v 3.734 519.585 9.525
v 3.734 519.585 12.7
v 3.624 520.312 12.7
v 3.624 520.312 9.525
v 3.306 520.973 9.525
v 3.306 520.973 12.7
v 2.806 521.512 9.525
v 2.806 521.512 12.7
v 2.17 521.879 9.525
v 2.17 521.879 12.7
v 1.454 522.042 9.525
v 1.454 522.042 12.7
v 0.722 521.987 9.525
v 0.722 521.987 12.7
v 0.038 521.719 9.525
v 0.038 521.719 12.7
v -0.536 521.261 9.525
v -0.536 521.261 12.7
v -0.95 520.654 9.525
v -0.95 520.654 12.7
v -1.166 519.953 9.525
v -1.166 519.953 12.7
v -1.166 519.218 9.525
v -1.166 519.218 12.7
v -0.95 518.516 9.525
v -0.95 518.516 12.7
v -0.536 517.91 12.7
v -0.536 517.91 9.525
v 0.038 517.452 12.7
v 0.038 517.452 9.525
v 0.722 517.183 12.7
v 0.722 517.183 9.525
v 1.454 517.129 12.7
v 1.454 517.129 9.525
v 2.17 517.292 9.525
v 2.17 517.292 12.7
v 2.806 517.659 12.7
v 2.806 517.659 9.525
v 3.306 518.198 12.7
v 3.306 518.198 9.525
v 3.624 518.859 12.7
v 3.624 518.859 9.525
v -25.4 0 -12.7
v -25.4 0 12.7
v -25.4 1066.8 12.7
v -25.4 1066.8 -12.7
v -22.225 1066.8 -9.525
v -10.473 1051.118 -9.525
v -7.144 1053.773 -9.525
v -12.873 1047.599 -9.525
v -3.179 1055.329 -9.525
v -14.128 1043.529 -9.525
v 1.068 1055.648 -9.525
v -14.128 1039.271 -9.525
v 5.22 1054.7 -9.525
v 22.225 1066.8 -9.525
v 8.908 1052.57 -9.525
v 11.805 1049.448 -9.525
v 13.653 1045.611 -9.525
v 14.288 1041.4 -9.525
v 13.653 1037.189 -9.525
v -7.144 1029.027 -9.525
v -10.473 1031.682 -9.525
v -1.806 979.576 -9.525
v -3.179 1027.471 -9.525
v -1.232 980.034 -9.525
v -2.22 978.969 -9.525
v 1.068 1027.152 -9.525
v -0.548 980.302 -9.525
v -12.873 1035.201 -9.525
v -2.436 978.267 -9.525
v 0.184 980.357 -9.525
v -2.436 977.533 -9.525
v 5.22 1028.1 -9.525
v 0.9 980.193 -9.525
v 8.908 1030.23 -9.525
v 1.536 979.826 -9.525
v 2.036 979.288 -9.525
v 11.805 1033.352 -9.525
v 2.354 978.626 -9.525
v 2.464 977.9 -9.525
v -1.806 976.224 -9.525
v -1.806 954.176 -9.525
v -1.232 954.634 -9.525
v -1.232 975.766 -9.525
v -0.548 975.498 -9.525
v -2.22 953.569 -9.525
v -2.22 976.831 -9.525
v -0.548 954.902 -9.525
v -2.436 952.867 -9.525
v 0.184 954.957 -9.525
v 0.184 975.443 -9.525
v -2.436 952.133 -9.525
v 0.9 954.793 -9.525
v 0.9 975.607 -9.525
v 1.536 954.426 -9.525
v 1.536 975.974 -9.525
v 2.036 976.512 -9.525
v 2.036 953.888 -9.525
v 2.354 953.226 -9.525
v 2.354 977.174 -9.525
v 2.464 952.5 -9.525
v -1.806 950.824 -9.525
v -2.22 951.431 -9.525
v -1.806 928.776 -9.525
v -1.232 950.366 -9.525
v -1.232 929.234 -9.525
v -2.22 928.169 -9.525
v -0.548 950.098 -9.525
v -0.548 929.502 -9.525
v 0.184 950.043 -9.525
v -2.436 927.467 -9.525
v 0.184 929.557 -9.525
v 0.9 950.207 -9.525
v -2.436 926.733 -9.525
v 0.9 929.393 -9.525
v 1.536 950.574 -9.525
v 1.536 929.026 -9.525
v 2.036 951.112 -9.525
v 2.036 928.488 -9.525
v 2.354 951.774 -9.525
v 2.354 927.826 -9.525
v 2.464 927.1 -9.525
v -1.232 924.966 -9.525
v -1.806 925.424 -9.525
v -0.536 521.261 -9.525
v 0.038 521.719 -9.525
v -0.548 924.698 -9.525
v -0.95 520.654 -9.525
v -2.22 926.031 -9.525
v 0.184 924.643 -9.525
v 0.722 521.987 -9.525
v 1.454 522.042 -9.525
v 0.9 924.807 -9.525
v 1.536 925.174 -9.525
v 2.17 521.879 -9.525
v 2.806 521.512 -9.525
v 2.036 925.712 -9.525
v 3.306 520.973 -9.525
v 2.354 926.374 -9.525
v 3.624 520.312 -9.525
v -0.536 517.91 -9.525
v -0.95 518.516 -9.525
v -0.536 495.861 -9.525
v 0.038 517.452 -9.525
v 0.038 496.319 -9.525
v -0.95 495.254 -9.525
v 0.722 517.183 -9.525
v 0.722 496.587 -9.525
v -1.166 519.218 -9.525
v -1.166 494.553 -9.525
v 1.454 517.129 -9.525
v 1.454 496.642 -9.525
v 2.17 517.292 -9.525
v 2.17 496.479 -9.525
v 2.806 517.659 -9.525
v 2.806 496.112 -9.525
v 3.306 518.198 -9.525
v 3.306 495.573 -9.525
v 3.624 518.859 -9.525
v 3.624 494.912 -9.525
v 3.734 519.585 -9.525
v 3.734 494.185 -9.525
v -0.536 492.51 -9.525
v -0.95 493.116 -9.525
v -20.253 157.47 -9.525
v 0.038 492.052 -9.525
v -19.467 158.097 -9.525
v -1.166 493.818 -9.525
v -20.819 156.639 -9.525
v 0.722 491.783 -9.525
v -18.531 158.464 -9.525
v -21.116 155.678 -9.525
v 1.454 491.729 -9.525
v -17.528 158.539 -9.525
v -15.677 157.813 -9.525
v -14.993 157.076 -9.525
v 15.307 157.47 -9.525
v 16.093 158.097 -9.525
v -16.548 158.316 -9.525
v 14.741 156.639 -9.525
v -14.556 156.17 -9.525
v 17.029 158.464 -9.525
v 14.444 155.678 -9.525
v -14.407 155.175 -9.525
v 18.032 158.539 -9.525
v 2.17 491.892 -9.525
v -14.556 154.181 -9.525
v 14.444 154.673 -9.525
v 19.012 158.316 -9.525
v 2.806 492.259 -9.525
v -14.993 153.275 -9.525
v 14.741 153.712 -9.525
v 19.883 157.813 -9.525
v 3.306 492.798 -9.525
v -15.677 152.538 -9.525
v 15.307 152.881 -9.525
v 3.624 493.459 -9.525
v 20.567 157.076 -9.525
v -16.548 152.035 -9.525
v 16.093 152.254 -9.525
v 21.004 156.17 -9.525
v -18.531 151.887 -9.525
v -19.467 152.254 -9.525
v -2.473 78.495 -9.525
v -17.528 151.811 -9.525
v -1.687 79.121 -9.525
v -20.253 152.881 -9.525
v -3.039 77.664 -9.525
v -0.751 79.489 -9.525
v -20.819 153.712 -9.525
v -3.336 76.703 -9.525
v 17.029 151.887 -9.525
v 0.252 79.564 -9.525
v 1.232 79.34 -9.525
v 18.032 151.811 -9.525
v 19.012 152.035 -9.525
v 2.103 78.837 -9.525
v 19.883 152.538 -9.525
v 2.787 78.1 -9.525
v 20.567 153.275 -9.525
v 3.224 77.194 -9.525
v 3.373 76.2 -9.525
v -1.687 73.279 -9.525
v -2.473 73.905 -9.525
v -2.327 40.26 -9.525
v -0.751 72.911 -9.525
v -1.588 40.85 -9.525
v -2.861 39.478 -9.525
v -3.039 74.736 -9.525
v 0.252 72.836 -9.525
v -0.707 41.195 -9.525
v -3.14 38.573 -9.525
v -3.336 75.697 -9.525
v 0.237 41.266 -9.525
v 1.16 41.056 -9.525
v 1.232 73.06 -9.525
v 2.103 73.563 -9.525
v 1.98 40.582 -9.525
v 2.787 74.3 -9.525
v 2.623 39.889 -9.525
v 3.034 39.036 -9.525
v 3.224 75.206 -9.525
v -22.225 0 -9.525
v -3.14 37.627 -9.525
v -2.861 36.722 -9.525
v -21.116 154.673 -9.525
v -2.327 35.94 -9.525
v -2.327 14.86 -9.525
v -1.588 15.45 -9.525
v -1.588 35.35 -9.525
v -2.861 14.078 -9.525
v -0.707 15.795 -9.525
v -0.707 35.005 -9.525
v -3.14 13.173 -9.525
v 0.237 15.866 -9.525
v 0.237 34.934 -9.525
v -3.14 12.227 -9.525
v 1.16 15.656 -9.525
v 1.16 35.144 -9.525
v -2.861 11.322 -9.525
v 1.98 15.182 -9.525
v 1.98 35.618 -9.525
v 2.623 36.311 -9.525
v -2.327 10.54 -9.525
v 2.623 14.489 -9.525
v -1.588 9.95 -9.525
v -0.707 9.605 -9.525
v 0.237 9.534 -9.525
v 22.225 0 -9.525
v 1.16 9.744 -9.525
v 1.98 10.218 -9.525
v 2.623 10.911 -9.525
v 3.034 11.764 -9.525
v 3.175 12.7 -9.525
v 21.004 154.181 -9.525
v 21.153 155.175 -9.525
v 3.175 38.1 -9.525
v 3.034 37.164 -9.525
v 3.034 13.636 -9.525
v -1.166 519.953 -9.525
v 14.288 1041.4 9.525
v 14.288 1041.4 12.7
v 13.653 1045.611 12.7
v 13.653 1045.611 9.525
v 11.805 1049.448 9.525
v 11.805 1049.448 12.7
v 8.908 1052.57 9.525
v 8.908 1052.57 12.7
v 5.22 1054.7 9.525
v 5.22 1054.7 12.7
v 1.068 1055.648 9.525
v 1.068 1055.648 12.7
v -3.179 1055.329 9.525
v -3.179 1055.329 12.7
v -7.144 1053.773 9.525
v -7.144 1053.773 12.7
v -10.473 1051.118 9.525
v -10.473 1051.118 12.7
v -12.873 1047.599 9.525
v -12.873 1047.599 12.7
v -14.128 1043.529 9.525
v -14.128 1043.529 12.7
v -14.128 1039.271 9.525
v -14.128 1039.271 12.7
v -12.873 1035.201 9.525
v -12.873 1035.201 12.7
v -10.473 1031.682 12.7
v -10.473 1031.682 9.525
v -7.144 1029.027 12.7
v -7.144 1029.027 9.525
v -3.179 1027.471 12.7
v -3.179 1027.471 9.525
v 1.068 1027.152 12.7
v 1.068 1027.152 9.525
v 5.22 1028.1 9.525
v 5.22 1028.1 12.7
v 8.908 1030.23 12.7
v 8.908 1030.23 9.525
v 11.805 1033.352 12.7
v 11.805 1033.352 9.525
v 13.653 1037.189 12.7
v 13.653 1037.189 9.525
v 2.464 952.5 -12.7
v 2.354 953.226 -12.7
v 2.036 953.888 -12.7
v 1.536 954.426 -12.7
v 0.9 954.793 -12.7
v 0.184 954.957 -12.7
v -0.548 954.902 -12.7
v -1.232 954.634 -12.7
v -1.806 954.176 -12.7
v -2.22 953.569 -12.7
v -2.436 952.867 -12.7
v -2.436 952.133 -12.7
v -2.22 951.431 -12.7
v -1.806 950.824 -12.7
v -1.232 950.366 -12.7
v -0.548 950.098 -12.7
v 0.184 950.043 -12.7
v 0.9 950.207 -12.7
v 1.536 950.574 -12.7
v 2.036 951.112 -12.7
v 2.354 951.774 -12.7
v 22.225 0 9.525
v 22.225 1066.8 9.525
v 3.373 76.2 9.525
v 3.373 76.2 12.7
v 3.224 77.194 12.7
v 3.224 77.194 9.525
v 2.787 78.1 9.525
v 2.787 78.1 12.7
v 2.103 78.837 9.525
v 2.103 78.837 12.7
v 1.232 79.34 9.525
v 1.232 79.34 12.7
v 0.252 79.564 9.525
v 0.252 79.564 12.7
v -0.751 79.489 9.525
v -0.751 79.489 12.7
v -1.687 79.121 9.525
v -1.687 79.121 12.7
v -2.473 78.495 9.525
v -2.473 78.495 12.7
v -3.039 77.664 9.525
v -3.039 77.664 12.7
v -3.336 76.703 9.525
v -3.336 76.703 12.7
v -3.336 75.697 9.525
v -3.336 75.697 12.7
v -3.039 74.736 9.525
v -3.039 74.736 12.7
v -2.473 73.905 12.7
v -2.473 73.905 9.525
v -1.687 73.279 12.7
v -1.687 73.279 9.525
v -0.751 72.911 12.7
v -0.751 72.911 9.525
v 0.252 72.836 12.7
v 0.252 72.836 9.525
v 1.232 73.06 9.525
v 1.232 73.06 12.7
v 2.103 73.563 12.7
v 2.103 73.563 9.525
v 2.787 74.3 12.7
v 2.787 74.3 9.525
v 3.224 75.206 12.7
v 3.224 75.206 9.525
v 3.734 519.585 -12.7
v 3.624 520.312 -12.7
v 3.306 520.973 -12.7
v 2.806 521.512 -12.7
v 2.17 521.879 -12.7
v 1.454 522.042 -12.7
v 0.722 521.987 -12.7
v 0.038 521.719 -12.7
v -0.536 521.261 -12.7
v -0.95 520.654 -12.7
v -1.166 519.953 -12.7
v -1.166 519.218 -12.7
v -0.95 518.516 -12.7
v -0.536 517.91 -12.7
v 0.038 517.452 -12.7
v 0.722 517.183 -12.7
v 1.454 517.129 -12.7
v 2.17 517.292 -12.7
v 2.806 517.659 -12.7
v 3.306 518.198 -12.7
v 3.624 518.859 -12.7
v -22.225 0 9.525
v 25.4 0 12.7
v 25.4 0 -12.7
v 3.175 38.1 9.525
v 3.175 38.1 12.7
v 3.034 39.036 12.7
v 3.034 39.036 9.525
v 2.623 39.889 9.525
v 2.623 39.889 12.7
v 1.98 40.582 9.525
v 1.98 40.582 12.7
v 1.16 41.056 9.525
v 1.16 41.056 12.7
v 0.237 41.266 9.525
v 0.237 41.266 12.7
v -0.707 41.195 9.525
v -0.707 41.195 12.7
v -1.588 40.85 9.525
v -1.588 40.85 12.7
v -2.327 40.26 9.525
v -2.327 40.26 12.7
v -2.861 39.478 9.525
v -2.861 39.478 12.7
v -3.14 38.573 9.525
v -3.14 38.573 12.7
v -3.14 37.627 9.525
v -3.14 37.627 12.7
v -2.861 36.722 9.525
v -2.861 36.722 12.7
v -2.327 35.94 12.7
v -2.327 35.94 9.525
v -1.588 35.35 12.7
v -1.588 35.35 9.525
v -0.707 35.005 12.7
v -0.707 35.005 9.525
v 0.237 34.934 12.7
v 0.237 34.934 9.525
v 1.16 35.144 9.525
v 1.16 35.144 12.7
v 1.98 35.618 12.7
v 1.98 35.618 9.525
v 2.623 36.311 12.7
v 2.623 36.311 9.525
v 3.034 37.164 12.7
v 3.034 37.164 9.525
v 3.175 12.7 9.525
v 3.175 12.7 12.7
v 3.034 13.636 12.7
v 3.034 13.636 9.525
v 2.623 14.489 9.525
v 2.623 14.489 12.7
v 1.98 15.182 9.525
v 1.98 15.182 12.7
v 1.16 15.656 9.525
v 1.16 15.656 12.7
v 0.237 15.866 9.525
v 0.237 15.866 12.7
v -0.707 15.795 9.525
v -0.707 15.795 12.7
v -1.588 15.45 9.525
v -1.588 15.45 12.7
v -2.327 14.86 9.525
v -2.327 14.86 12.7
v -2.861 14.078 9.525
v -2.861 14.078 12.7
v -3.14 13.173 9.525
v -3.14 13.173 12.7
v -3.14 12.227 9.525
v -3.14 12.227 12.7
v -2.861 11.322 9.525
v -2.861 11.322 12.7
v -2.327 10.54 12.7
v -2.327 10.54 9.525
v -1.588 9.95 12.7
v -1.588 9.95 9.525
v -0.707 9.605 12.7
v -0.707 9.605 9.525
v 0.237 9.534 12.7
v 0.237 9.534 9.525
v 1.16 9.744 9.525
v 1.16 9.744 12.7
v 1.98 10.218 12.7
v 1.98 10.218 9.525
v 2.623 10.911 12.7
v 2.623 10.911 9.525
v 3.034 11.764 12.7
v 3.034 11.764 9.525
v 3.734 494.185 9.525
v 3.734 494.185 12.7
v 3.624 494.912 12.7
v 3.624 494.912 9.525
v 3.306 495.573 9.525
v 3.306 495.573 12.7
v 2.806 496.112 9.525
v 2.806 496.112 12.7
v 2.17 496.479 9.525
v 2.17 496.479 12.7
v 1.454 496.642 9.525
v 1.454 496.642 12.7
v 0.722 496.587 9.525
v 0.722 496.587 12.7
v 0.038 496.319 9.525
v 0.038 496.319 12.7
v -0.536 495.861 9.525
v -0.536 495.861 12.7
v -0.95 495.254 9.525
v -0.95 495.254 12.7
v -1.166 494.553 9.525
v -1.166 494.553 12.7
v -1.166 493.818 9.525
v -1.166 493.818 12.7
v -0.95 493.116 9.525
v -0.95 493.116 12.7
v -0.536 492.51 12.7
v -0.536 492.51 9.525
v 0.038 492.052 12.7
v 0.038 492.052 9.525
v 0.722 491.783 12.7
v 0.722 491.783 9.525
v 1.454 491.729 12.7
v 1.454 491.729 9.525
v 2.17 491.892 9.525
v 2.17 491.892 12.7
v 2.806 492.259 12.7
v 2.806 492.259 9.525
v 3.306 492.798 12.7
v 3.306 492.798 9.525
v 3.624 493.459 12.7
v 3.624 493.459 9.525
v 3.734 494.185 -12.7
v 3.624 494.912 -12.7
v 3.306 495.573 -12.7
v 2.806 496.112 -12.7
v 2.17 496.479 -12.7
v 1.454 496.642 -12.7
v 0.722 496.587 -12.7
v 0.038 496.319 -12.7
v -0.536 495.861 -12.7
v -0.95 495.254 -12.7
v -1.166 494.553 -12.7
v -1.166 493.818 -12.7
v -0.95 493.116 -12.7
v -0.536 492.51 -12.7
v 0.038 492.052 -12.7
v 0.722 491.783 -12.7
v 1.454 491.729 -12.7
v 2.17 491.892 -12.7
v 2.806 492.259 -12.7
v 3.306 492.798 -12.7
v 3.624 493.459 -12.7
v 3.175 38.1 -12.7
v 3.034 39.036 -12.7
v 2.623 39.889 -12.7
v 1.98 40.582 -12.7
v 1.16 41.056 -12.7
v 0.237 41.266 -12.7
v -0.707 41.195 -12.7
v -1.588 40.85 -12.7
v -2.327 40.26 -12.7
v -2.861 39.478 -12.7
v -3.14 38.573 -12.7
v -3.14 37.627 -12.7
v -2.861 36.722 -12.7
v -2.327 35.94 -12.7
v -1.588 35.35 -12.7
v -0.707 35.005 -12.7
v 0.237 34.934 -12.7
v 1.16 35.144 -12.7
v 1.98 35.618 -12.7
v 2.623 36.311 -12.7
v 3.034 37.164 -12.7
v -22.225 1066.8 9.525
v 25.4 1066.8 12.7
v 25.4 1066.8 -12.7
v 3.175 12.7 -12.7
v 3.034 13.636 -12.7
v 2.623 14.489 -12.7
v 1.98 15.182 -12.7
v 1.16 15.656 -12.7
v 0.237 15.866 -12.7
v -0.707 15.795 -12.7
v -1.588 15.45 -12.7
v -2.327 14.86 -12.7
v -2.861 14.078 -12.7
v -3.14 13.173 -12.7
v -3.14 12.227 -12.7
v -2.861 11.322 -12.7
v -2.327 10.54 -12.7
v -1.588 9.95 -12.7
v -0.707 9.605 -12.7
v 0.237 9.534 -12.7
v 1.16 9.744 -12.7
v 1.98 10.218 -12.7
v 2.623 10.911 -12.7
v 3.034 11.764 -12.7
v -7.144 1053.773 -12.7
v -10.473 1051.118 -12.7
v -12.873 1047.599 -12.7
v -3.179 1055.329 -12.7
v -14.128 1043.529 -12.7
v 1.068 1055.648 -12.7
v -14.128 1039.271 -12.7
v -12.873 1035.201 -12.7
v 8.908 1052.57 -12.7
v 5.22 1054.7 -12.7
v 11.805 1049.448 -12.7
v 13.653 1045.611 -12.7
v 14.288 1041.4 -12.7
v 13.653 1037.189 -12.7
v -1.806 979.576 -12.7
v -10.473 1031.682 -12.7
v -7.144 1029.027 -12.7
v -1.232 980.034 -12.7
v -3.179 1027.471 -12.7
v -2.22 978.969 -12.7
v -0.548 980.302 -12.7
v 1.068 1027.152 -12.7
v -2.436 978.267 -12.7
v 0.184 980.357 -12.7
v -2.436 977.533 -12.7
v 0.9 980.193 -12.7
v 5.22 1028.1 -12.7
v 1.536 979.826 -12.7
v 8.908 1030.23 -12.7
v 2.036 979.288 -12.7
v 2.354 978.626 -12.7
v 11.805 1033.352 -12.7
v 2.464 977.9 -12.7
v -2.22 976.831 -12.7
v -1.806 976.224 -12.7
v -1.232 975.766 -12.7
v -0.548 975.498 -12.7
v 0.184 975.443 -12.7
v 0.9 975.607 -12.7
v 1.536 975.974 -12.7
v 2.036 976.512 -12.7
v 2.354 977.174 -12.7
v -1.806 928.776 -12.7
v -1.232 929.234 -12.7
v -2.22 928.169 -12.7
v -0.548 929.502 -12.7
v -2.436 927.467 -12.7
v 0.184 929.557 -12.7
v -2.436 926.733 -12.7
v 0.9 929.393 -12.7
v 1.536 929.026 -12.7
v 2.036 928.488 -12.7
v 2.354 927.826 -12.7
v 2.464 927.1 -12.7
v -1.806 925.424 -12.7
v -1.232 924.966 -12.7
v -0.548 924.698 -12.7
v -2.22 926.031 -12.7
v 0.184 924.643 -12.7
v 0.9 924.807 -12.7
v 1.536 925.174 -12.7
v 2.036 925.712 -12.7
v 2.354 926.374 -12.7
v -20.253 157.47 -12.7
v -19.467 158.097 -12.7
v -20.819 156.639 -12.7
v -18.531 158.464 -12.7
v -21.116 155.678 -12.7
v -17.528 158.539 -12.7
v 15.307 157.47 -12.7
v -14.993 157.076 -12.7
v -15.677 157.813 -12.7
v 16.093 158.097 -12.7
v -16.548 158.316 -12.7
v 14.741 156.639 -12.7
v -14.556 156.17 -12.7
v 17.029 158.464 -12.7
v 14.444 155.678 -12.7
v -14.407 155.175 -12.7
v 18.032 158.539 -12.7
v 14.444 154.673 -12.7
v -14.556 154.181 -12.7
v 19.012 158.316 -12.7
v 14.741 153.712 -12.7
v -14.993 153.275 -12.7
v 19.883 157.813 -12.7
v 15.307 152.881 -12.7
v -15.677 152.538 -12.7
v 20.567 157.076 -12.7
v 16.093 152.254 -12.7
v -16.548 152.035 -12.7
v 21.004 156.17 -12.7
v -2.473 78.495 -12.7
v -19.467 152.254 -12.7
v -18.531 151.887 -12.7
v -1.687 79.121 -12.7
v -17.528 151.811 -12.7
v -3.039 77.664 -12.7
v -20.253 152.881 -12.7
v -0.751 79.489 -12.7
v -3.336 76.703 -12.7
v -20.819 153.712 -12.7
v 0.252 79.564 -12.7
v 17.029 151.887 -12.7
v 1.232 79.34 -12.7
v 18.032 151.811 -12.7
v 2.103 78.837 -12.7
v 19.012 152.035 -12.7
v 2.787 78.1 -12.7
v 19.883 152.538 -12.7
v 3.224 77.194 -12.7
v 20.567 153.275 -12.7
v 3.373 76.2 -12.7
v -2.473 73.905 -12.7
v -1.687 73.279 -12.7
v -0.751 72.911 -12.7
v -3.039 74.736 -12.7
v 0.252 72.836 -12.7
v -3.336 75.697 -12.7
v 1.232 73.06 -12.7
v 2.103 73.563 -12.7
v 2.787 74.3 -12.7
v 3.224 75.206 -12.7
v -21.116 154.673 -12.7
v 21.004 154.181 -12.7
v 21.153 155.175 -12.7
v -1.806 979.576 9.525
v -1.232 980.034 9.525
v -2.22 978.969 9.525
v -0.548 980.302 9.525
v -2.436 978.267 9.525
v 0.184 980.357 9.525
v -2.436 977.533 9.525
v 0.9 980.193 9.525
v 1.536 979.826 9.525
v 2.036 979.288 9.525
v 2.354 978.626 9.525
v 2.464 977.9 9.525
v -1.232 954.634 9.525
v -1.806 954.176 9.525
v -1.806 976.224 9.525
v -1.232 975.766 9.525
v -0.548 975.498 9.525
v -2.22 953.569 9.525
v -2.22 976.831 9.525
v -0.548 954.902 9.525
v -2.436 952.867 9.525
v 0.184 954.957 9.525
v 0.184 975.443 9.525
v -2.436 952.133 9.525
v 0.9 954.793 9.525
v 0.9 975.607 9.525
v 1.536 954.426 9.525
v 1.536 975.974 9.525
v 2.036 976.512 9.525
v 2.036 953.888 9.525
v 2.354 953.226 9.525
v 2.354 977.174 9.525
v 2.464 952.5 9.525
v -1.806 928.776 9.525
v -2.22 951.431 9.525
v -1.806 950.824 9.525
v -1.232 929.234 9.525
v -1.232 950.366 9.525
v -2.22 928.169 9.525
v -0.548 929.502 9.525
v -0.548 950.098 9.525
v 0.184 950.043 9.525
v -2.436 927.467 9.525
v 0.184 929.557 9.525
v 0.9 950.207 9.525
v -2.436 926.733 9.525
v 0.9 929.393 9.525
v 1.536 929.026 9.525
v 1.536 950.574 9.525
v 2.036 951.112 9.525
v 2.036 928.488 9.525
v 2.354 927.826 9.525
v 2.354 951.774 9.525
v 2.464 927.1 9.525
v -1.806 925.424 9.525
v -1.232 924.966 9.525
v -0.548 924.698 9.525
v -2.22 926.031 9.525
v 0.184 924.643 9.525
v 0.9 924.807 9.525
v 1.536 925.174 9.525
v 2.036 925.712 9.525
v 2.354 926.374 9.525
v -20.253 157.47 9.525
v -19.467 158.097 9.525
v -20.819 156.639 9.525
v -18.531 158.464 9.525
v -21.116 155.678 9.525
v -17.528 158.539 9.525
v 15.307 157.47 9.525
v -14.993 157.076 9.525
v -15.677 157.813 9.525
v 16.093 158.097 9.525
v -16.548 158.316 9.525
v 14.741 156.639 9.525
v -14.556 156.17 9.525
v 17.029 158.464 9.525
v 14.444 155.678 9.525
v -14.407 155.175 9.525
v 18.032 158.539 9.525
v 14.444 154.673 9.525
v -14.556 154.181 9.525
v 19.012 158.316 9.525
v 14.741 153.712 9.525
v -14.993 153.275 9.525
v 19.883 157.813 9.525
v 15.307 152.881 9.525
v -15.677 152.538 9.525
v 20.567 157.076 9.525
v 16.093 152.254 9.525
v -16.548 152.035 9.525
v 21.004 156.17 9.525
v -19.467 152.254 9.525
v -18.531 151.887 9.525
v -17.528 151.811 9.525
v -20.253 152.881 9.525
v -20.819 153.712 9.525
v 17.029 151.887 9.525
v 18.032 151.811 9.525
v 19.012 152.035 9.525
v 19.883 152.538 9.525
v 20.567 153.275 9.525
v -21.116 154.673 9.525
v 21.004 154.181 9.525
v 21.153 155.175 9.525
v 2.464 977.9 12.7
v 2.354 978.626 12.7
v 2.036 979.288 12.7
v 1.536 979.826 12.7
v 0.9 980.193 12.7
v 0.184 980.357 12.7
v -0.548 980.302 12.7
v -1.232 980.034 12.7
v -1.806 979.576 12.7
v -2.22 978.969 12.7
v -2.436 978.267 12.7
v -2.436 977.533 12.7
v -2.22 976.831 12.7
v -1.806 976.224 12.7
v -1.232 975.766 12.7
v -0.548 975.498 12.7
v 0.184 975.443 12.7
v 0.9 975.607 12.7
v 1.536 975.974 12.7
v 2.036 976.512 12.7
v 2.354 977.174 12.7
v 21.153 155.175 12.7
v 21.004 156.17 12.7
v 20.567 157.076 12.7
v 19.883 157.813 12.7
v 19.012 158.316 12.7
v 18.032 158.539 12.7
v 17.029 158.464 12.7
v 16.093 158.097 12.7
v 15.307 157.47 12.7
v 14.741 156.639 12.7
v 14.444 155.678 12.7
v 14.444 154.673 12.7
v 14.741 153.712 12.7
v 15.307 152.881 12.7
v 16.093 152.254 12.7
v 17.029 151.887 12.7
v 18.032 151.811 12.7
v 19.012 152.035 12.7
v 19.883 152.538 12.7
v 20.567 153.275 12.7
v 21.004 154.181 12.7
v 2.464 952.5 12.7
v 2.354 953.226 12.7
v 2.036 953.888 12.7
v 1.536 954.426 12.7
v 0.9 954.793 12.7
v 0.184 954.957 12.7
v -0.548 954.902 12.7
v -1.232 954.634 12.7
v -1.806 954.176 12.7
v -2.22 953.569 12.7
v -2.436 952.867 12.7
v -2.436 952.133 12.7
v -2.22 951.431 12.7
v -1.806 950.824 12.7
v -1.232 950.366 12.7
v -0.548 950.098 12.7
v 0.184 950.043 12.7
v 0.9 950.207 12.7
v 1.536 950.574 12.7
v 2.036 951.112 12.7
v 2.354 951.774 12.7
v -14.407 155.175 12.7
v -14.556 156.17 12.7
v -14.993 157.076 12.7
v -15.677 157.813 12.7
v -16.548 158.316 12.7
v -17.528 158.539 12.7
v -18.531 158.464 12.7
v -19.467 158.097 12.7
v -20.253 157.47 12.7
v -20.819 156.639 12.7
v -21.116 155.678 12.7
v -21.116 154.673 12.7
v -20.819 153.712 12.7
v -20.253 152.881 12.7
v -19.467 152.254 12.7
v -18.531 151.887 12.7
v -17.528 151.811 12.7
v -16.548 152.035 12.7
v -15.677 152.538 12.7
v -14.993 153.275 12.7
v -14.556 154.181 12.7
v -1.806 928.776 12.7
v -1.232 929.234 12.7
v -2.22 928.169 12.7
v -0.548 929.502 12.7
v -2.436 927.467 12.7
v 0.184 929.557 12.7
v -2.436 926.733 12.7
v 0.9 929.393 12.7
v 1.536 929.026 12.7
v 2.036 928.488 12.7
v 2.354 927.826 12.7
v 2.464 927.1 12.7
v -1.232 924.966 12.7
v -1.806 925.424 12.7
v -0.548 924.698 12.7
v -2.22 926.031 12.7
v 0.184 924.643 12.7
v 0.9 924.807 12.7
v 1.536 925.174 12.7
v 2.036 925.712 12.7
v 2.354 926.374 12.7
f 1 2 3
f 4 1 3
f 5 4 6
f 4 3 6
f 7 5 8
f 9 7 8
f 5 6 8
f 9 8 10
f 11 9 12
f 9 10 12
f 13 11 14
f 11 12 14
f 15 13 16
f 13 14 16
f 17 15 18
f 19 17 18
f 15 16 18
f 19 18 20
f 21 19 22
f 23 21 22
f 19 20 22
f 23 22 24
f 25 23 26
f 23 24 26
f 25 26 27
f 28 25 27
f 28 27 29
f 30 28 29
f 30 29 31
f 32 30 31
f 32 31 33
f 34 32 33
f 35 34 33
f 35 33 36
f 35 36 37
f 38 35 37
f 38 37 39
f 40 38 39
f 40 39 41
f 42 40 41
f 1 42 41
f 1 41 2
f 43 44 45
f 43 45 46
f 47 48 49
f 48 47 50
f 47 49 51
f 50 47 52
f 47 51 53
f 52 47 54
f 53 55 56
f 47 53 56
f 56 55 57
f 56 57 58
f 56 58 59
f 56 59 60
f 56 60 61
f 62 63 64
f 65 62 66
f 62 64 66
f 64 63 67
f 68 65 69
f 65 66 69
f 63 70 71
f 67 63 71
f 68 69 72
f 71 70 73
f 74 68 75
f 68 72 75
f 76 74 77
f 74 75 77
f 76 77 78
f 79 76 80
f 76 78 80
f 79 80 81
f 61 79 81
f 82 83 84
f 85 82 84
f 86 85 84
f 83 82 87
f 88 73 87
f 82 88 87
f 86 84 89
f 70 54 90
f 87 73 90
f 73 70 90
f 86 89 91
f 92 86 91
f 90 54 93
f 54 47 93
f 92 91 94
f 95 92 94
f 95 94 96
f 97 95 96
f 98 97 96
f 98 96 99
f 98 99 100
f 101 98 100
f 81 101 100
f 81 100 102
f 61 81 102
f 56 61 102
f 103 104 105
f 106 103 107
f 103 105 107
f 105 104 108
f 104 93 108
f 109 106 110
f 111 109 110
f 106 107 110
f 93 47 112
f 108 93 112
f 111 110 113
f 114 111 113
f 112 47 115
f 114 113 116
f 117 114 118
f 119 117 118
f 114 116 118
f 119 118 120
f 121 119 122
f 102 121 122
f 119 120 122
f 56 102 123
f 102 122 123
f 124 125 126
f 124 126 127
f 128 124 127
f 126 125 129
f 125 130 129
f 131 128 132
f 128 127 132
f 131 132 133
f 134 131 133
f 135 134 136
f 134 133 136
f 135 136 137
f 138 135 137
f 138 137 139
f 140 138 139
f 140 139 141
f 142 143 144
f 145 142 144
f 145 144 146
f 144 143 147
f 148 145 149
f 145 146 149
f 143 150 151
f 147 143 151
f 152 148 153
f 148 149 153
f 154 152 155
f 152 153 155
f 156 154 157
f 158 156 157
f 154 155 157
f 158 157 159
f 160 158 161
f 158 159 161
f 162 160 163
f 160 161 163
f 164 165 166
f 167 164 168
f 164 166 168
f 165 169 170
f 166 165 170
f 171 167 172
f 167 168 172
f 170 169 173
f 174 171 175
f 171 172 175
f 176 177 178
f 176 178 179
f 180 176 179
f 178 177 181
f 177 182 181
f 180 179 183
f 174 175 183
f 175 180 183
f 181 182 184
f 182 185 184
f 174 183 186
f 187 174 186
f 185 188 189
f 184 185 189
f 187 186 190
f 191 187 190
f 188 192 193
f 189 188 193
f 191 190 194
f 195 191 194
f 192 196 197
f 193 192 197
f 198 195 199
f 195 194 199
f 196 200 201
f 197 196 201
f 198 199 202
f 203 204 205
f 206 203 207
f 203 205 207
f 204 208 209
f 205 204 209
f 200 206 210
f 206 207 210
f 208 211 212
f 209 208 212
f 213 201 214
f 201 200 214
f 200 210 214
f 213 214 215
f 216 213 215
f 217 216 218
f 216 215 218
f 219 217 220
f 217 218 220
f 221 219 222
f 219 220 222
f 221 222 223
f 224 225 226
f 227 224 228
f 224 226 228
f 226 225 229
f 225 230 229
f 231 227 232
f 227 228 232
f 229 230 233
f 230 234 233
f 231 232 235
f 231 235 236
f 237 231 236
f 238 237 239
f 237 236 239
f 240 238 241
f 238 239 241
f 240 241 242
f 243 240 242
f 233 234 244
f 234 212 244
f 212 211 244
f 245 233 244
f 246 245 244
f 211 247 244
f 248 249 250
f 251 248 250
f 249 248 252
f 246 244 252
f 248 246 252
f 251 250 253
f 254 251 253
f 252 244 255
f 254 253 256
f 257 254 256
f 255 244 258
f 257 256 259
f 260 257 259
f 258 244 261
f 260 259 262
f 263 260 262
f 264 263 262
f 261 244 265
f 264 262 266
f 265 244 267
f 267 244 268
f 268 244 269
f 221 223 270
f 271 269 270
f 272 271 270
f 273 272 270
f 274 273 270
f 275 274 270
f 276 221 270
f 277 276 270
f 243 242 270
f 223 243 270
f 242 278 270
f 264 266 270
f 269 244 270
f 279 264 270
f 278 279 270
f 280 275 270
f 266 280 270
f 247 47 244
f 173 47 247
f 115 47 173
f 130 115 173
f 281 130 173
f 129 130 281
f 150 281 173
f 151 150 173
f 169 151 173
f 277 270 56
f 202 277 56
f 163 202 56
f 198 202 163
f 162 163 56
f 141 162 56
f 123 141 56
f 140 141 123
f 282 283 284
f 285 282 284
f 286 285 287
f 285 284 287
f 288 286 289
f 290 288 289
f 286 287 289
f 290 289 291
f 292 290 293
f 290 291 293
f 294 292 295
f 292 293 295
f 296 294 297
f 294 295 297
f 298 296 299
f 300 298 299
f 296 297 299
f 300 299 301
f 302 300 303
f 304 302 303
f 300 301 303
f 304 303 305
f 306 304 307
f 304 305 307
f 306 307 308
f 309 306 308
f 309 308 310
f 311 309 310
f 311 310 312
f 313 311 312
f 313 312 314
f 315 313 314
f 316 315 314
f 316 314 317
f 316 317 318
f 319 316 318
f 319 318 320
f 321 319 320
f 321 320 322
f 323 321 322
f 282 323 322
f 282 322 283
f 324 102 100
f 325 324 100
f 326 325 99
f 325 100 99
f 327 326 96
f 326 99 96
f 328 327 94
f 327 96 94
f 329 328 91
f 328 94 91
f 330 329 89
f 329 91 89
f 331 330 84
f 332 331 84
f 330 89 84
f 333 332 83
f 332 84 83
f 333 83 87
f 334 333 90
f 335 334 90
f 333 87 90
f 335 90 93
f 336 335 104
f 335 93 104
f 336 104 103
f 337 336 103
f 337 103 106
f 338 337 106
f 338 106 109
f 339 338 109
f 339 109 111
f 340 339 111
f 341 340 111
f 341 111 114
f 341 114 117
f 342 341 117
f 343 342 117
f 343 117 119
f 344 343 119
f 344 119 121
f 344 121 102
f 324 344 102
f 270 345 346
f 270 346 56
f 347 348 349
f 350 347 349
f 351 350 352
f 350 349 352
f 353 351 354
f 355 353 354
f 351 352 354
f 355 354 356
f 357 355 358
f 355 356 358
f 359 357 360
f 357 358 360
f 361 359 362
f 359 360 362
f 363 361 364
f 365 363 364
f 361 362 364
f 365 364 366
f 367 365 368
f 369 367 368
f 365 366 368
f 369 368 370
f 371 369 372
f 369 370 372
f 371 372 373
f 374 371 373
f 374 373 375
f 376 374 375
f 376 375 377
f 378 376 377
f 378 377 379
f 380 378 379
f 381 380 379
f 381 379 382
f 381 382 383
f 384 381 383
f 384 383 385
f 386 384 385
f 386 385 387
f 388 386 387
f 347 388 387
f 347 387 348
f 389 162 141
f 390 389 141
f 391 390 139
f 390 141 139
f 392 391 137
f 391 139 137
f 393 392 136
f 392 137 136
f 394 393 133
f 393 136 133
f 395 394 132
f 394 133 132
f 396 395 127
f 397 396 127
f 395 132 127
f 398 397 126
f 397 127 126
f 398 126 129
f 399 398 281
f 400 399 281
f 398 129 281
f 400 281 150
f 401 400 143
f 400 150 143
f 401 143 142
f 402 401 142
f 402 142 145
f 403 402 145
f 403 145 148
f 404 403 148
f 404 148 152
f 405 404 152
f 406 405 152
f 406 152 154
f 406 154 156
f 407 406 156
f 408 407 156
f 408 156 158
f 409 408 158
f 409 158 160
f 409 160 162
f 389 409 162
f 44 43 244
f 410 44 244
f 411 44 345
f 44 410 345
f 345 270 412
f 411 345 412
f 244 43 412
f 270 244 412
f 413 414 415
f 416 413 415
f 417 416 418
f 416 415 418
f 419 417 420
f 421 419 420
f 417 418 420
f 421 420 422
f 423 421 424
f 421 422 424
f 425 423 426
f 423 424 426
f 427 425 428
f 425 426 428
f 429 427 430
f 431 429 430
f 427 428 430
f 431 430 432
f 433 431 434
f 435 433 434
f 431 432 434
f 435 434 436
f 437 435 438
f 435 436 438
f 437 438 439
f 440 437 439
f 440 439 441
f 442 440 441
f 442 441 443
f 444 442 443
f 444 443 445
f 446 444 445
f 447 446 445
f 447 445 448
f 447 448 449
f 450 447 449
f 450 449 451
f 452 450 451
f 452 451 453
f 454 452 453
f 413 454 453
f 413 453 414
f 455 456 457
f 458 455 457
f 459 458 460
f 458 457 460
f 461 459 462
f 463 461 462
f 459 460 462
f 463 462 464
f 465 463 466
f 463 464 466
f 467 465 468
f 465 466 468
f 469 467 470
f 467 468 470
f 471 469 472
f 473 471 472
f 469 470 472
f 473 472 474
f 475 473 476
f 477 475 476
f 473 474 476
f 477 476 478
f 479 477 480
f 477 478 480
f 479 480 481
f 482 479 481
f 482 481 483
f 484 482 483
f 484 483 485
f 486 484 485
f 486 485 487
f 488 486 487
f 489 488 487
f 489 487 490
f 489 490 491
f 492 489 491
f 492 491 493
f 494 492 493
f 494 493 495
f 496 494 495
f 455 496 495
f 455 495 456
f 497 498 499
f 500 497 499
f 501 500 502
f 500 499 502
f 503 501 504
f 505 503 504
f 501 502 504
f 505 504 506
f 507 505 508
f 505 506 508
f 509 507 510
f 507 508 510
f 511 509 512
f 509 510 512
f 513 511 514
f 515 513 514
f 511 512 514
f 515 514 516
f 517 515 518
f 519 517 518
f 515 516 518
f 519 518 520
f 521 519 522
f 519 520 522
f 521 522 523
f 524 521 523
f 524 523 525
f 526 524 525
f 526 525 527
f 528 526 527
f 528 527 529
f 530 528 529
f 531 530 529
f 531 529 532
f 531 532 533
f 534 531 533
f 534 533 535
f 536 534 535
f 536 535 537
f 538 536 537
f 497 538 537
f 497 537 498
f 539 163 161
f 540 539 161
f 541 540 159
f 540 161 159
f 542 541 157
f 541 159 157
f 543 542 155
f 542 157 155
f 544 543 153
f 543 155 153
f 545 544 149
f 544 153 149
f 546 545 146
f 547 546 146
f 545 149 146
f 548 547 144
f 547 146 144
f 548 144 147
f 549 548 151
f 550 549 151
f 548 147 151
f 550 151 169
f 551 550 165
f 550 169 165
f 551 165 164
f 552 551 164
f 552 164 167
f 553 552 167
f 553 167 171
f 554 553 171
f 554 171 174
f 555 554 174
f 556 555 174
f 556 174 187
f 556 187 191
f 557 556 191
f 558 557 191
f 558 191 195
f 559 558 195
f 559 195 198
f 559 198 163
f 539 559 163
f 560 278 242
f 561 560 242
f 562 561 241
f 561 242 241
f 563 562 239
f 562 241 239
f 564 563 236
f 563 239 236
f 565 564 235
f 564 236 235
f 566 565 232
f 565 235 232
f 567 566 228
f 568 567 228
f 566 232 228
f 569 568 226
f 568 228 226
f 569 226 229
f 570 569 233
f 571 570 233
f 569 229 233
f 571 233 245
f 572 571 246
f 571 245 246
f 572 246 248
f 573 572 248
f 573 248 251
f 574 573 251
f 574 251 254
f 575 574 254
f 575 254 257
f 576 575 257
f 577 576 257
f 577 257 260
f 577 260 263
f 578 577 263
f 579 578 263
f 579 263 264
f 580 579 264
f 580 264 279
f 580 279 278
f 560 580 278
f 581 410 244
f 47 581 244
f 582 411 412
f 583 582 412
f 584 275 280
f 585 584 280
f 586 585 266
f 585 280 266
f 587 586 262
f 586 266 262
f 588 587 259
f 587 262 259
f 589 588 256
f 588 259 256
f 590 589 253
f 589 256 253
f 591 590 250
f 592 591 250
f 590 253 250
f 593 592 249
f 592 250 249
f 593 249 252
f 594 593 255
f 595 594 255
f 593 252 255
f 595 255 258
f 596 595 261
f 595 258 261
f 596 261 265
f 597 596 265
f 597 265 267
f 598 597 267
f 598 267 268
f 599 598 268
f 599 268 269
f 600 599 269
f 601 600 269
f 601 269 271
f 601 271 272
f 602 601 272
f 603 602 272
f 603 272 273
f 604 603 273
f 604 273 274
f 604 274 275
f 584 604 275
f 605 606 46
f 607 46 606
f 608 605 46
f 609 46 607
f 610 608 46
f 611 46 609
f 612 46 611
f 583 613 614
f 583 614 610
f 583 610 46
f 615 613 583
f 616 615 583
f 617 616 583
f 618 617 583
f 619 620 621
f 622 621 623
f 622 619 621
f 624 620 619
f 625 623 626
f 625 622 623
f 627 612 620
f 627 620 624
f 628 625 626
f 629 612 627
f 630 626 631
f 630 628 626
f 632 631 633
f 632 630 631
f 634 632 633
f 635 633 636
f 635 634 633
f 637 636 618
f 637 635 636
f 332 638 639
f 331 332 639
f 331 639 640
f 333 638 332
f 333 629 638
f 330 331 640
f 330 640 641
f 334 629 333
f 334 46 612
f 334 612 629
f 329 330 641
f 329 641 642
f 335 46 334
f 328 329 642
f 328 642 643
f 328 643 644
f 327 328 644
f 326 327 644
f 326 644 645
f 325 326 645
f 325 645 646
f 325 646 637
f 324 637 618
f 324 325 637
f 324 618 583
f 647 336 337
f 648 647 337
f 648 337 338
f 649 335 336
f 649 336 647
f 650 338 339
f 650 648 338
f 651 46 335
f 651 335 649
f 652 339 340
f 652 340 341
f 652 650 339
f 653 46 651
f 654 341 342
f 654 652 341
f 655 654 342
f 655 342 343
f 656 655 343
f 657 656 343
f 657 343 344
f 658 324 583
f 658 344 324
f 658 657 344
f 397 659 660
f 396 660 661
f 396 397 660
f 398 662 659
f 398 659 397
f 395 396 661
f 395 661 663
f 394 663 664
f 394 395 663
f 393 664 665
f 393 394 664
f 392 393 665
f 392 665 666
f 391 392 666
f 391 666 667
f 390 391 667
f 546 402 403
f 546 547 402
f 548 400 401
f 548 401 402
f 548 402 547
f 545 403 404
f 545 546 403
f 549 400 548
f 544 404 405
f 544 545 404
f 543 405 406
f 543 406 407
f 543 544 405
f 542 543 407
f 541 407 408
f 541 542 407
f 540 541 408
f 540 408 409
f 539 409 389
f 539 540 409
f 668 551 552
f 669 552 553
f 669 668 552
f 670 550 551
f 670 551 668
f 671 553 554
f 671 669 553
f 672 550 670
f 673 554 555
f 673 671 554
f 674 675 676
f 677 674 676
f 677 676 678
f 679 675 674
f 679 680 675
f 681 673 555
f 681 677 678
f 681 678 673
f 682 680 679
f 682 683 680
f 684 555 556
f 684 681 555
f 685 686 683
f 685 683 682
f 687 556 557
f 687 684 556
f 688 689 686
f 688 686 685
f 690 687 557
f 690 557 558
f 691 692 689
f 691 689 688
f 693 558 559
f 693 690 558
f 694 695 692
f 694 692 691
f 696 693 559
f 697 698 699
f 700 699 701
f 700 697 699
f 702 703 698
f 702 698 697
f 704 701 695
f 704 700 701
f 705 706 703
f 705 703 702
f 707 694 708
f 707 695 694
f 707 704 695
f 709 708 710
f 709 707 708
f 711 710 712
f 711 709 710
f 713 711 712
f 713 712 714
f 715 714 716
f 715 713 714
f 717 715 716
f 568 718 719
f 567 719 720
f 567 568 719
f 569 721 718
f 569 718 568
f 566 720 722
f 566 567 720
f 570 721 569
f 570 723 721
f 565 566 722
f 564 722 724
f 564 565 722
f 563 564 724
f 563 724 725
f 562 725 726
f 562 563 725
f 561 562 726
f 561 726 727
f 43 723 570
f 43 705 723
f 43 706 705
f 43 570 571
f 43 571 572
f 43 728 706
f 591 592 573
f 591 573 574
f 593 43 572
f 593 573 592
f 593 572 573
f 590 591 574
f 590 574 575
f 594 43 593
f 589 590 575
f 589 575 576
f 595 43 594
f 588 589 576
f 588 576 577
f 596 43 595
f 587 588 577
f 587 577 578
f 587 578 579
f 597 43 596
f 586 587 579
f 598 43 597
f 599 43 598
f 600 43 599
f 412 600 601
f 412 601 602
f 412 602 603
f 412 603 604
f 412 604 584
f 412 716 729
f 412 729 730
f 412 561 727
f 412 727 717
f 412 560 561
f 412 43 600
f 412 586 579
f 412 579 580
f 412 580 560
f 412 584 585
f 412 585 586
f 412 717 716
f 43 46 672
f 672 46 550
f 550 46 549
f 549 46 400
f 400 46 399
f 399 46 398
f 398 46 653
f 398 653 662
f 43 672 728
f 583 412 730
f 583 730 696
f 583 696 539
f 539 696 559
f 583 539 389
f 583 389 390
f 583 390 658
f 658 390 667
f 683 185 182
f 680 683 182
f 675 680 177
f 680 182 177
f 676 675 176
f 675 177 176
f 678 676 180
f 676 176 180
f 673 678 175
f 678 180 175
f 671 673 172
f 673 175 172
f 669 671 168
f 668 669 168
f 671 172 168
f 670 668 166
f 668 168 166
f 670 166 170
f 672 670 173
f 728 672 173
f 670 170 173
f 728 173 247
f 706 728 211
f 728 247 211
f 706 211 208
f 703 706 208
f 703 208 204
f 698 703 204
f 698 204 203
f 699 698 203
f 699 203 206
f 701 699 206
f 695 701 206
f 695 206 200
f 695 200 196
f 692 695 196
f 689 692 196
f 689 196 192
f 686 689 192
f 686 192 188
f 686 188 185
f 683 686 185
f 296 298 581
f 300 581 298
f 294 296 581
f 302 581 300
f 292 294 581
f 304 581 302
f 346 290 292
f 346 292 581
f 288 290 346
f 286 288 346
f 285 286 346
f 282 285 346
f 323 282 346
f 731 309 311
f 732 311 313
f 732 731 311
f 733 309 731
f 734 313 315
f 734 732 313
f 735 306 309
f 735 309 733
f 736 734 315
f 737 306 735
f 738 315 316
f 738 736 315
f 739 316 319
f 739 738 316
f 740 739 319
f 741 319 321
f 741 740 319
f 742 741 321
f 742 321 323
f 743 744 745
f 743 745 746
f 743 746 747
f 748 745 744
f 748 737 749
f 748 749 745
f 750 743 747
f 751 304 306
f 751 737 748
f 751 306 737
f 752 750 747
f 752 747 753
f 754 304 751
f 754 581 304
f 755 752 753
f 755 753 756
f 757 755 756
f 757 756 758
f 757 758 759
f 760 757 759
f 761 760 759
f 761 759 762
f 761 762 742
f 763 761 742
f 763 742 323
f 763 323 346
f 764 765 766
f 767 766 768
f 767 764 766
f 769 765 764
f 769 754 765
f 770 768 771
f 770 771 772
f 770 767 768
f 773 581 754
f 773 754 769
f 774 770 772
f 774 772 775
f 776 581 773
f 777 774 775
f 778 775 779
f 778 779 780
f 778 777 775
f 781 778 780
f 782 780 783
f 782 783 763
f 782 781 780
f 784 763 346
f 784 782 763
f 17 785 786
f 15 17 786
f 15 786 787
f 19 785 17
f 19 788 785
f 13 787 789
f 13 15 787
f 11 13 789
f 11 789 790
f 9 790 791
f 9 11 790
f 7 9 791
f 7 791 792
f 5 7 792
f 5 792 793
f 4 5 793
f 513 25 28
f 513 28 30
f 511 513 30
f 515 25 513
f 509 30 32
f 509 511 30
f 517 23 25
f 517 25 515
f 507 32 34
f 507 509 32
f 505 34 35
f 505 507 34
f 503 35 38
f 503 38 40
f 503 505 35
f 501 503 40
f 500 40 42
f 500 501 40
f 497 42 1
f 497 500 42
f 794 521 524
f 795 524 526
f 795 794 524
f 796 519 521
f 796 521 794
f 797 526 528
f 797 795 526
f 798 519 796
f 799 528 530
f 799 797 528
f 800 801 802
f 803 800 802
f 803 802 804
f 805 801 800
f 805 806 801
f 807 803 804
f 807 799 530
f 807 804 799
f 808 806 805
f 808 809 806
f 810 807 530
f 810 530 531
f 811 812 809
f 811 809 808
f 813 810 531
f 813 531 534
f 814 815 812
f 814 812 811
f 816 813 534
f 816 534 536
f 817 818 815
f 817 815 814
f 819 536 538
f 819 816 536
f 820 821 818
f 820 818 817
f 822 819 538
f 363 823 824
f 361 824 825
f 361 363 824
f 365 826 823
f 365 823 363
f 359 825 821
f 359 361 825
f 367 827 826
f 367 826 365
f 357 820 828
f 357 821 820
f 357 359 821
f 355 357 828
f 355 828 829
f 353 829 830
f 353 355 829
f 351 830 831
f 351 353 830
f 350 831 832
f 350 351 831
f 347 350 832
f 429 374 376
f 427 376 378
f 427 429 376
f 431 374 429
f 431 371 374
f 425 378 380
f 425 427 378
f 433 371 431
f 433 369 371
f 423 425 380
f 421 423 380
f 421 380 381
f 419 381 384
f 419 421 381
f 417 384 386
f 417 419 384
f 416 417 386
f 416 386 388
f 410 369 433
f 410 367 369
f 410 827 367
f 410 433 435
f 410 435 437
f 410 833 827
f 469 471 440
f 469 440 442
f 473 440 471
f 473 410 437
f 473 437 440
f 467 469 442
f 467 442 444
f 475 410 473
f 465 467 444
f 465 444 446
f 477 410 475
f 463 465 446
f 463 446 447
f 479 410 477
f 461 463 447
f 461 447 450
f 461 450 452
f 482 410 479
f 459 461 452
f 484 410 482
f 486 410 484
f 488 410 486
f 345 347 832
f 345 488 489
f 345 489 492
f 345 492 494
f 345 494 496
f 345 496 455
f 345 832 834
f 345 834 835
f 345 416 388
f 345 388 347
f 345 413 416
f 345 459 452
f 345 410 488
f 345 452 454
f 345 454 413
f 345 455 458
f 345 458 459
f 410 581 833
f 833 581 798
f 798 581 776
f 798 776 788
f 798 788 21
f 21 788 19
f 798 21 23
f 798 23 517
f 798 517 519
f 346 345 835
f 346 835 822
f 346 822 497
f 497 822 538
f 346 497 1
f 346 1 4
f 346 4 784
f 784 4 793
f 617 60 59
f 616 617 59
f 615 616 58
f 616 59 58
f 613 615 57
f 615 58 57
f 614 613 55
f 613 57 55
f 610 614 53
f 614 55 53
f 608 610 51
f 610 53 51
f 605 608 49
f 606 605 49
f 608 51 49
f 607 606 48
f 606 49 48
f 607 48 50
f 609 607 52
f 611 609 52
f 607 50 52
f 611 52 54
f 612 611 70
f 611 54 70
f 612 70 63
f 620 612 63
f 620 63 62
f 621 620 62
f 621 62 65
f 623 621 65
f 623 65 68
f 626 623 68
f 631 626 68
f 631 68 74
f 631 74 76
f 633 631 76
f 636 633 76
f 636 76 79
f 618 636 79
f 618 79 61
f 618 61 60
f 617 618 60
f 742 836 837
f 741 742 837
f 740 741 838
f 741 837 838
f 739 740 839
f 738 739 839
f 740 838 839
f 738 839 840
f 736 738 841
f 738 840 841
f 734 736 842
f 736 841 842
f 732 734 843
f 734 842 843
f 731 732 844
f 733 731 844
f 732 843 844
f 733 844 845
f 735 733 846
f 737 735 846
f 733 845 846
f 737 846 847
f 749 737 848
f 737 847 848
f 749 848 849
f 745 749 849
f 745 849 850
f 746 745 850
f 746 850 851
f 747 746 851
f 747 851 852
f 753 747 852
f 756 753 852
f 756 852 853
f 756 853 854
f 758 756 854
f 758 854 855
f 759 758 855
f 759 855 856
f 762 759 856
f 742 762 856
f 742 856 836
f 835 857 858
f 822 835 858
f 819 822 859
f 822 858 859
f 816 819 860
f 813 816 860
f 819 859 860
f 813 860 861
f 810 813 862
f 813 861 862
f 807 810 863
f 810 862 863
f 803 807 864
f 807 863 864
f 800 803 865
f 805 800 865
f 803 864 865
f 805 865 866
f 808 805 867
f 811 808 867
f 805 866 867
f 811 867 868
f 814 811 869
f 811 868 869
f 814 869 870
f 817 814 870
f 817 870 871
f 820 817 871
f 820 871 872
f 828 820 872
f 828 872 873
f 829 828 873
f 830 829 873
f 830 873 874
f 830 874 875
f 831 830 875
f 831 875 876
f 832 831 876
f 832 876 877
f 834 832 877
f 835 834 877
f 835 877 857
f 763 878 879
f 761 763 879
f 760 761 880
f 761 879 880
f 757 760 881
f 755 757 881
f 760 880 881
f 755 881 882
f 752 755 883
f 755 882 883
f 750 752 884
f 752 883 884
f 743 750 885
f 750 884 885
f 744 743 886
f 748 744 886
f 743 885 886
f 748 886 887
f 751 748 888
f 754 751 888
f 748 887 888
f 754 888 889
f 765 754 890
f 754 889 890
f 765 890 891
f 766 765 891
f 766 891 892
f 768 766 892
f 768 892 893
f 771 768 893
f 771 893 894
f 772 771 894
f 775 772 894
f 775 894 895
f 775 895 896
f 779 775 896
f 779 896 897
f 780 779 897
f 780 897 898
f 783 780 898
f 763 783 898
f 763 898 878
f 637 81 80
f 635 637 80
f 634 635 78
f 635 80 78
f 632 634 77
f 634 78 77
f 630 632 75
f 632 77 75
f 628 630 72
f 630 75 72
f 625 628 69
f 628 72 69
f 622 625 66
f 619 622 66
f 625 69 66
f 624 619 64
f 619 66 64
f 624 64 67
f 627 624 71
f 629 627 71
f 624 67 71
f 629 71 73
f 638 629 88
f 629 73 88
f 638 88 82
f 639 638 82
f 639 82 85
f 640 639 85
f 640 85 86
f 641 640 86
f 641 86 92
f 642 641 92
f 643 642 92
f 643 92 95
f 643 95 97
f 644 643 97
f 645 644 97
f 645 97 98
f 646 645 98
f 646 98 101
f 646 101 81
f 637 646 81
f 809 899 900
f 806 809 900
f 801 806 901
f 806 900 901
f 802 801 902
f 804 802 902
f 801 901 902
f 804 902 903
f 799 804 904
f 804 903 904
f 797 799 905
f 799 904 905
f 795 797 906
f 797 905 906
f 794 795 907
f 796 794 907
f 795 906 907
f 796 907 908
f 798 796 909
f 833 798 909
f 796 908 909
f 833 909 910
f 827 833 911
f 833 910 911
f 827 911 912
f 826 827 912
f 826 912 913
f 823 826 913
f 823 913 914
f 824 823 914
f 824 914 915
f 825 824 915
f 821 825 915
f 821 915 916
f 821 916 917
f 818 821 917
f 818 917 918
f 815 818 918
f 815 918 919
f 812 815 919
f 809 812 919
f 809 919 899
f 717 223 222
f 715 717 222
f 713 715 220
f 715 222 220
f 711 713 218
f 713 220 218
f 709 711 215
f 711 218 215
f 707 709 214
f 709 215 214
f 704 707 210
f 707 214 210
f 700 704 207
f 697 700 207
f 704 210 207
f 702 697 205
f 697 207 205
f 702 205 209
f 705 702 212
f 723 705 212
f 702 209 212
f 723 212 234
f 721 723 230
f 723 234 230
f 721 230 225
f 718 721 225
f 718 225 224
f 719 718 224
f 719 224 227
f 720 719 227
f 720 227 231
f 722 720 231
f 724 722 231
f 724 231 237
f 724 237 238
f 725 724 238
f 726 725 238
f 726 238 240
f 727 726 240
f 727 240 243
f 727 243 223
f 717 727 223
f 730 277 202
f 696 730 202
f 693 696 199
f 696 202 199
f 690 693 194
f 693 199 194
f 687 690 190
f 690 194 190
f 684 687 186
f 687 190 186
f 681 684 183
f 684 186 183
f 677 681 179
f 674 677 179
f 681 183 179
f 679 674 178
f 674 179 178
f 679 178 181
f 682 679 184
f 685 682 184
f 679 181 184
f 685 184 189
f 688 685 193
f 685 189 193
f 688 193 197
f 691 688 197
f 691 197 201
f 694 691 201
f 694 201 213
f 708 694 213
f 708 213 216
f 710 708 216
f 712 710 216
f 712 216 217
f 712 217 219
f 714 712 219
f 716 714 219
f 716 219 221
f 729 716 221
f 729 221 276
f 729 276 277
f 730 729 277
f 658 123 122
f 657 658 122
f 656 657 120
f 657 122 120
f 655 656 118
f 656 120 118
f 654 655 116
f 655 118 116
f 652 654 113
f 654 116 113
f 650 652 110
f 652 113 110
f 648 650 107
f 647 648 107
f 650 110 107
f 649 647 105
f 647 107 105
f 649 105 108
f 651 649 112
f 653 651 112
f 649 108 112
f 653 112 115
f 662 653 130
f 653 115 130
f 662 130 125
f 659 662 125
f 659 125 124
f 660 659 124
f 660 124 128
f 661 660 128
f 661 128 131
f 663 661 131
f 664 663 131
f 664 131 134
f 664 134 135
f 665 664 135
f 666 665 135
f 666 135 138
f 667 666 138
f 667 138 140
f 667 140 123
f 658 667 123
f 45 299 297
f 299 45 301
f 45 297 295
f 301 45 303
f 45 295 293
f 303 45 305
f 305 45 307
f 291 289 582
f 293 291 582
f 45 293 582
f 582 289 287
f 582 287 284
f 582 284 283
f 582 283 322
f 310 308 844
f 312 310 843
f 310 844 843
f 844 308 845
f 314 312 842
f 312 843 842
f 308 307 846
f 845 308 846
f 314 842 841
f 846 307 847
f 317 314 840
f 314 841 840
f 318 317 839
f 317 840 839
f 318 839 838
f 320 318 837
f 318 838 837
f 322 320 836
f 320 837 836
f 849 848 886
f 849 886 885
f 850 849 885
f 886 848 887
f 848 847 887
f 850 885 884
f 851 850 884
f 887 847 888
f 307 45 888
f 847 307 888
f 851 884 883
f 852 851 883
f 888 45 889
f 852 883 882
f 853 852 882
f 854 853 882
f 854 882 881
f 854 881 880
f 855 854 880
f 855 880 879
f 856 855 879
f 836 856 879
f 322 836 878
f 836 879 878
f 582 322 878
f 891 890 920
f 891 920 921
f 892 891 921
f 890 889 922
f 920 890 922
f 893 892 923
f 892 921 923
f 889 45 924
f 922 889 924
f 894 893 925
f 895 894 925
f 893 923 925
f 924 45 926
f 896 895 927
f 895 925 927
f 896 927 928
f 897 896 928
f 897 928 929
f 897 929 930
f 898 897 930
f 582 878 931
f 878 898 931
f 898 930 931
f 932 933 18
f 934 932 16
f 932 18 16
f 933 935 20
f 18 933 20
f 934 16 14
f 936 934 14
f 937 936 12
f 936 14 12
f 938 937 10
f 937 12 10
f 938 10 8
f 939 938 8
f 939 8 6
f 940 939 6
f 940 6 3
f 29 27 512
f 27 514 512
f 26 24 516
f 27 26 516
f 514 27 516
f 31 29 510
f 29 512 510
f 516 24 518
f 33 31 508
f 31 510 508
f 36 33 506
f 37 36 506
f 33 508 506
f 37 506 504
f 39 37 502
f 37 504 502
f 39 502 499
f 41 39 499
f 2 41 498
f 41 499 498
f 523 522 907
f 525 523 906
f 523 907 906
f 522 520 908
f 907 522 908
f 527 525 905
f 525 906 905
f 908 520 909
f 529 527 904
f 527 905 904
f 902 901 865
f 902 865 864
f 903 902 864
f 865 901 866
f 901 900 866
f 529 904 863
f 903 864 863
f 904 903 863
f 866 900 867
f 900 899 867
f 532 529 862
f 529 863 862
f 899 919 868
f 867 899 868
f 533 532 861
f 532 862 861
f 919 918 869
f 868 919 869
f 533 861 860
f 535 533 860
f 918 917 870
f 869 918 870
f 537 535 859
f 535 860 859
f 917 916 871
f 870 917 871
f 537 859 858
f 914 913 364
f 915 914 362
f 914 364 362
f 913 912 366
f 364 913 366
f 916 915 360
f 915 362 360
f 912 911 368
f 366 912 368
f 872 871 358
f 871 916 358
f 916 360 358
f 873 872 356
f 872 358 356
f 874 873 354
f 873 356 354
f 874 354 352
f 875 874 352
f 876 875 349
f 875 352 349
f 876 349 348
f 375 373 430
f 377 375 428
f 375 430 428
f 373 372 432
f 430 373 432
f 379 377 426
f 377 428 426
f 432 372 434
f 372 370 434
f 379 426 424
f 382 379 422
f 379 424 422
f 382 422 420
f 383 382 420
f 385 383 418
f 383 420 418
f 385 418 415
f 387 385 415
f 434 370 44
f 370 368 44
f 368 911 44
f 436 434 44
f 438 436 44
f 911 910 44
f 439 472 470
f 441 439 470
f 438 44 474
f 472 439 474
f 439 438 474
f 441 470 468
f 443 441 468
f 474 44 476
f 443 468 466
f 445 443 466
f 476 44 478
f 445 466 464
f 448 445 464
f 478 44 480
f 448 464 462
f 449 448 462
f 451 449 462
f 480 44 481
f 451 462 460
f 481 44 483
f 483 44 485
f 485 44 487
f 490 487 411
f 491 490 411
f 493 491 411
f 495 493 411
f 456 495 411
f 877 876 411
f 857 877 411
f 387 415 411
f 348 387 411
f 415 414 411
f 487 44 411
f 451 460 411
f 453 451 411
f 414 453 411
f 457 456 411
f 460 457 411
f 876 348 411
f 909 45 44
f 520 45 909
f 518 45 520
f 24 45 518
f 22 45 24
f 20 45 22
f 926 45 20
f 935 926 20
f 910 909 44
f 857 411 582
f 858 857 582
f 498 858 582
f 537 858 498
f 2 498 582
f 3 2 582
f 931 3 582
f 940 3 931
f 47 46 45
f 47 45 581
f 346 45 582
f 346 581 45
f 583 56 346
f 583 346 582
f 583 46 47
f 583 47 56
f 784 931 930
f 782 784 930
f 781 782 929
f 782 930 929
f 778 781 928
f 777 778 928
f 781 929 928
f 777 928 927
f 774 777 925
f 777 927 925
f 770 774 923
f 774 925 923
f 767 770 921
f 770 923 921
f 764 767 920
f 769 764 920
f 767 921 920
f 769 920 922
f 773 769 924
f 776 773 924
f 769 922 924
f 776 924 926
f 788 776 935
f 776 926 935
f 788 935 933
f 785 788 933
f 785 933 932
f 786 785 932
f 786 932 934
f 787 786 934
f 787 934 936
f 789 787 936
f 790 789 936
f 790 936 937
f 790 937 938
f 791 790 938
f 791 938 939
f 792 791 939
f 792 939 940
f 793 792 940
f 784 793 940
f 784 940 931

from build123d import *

# Parameters (mm, degrees)
SKETCH1_W           = 50.8
SKETCH1_H           = 25.4
SKETCH1_W_2         = 44.45
SKETCH1_H_2         = 19.05
BOSS_EXTRUDE1_DEPTH = 1066.8
SKETCH2_R           = 14.2875
CUT_EXTRUDE1_DEPTH  = 1068.404590584
SKETCH3_R           = 3.175
CUT_EXTRUDE2_DEPTH  = 1068.404590584
SKETCH4_R           = 2.4638
CUT_EXTRUDE3_DEPTH  = 1068.404590584
SKETCH5_R           = 3.3734375
CUT_EXTRUDE4_DEPTH  = 1068.404590584
SKETCH6_R           = 3.3734375
CUT_EXTRUDE5_DEPTH  = 1068.404590584


with BuildPart() as part:
    # Sketch1 → Boss-Extrude1 (new body)
    with BuildSketch(Plane(origin=(0, 0, 0), x_dir=(1, 0, 0), z_dir=(0, 1, 0))):
        Rectangle(SKETCH1_W, SKETCH1_H)
        Rectangle(SKETCH1_W_2, SKETCH1_H_2, mode=Mode.SUBTRACT)
    extrude(amount=BOSS_EXTRUDE1_DEPTH)

    # Sketch2 → Cut-Extrude1 (cut, through all)
    with BuildSketch(Plane.XY.offset(12.7)):
        with Locations((0, 1041.4)):
            Circle(SKETCH2_R)
    extrude(amount=-CUT_EXTRUDE1_DEPTH, mode=Mode.SUBTRACT)

    # Sketch3 → Cut-Extrude2 (cut, through all)
    with BuildSketch(Plane.XY.offset(12.7)):
        with Locations((0, 12.7)):
            Circle(SKETCH3_R)
        with Locations((0, 38.1)):
            Circle(SKETCH3_R)
    extrude(amount=-CUT_EXTRUDE2_DEPTH, mode=Mode.SUBTRACT)

    # Sketch4 → Cut-Extrude3 (cut, through all)
    with BuildSketch(Plane.XY.offset(12.7)):
        with Locations((0, 977.9)):
            Circle(SKETCH4_R)
        with Locations((0, 952.5)):
            Circle(SKETCH4_R)
        with Locations((0, 927.1)):
            Circle(SKETCH4_R)
        with Locations((1.27, 519.585439926)):
            Circle(SKETCH4_R)
        with Locations((1.27, 494.185439926)):
            Circle(SKETCH4_R)
    extrude(amount=-CUT_EXTRUDE3_DEPTH, mode=Mode.SUBTRACT)

    # Sketch5 → Cut-Extrude4 (cut, through all)
    with BuildSketch(Plane.XY.offset(12.7)):
        with Locations((0, 76.2)):
            Circle(SKETCH5_R)
    extrude(amount=-CUT_EXTRUDE4_DEPTH, mode=Mode.SUBTRACT)

    # Sketch6 → Cut-Extrude5 (cut, through all)
    with BuildSketch(Plane.XY.offset(12.7)):
        with Locations((-17.78, 155.17537)):
            Circle(SKETCH6_R)
        with Locations((17.78, 155.17537)):
            Circle(SKETCH6_R)
    extrude(amount=-CUT_EXTRUDE5_DEPTH, mode=Mode.SUBTRACT)


solid = part.part
